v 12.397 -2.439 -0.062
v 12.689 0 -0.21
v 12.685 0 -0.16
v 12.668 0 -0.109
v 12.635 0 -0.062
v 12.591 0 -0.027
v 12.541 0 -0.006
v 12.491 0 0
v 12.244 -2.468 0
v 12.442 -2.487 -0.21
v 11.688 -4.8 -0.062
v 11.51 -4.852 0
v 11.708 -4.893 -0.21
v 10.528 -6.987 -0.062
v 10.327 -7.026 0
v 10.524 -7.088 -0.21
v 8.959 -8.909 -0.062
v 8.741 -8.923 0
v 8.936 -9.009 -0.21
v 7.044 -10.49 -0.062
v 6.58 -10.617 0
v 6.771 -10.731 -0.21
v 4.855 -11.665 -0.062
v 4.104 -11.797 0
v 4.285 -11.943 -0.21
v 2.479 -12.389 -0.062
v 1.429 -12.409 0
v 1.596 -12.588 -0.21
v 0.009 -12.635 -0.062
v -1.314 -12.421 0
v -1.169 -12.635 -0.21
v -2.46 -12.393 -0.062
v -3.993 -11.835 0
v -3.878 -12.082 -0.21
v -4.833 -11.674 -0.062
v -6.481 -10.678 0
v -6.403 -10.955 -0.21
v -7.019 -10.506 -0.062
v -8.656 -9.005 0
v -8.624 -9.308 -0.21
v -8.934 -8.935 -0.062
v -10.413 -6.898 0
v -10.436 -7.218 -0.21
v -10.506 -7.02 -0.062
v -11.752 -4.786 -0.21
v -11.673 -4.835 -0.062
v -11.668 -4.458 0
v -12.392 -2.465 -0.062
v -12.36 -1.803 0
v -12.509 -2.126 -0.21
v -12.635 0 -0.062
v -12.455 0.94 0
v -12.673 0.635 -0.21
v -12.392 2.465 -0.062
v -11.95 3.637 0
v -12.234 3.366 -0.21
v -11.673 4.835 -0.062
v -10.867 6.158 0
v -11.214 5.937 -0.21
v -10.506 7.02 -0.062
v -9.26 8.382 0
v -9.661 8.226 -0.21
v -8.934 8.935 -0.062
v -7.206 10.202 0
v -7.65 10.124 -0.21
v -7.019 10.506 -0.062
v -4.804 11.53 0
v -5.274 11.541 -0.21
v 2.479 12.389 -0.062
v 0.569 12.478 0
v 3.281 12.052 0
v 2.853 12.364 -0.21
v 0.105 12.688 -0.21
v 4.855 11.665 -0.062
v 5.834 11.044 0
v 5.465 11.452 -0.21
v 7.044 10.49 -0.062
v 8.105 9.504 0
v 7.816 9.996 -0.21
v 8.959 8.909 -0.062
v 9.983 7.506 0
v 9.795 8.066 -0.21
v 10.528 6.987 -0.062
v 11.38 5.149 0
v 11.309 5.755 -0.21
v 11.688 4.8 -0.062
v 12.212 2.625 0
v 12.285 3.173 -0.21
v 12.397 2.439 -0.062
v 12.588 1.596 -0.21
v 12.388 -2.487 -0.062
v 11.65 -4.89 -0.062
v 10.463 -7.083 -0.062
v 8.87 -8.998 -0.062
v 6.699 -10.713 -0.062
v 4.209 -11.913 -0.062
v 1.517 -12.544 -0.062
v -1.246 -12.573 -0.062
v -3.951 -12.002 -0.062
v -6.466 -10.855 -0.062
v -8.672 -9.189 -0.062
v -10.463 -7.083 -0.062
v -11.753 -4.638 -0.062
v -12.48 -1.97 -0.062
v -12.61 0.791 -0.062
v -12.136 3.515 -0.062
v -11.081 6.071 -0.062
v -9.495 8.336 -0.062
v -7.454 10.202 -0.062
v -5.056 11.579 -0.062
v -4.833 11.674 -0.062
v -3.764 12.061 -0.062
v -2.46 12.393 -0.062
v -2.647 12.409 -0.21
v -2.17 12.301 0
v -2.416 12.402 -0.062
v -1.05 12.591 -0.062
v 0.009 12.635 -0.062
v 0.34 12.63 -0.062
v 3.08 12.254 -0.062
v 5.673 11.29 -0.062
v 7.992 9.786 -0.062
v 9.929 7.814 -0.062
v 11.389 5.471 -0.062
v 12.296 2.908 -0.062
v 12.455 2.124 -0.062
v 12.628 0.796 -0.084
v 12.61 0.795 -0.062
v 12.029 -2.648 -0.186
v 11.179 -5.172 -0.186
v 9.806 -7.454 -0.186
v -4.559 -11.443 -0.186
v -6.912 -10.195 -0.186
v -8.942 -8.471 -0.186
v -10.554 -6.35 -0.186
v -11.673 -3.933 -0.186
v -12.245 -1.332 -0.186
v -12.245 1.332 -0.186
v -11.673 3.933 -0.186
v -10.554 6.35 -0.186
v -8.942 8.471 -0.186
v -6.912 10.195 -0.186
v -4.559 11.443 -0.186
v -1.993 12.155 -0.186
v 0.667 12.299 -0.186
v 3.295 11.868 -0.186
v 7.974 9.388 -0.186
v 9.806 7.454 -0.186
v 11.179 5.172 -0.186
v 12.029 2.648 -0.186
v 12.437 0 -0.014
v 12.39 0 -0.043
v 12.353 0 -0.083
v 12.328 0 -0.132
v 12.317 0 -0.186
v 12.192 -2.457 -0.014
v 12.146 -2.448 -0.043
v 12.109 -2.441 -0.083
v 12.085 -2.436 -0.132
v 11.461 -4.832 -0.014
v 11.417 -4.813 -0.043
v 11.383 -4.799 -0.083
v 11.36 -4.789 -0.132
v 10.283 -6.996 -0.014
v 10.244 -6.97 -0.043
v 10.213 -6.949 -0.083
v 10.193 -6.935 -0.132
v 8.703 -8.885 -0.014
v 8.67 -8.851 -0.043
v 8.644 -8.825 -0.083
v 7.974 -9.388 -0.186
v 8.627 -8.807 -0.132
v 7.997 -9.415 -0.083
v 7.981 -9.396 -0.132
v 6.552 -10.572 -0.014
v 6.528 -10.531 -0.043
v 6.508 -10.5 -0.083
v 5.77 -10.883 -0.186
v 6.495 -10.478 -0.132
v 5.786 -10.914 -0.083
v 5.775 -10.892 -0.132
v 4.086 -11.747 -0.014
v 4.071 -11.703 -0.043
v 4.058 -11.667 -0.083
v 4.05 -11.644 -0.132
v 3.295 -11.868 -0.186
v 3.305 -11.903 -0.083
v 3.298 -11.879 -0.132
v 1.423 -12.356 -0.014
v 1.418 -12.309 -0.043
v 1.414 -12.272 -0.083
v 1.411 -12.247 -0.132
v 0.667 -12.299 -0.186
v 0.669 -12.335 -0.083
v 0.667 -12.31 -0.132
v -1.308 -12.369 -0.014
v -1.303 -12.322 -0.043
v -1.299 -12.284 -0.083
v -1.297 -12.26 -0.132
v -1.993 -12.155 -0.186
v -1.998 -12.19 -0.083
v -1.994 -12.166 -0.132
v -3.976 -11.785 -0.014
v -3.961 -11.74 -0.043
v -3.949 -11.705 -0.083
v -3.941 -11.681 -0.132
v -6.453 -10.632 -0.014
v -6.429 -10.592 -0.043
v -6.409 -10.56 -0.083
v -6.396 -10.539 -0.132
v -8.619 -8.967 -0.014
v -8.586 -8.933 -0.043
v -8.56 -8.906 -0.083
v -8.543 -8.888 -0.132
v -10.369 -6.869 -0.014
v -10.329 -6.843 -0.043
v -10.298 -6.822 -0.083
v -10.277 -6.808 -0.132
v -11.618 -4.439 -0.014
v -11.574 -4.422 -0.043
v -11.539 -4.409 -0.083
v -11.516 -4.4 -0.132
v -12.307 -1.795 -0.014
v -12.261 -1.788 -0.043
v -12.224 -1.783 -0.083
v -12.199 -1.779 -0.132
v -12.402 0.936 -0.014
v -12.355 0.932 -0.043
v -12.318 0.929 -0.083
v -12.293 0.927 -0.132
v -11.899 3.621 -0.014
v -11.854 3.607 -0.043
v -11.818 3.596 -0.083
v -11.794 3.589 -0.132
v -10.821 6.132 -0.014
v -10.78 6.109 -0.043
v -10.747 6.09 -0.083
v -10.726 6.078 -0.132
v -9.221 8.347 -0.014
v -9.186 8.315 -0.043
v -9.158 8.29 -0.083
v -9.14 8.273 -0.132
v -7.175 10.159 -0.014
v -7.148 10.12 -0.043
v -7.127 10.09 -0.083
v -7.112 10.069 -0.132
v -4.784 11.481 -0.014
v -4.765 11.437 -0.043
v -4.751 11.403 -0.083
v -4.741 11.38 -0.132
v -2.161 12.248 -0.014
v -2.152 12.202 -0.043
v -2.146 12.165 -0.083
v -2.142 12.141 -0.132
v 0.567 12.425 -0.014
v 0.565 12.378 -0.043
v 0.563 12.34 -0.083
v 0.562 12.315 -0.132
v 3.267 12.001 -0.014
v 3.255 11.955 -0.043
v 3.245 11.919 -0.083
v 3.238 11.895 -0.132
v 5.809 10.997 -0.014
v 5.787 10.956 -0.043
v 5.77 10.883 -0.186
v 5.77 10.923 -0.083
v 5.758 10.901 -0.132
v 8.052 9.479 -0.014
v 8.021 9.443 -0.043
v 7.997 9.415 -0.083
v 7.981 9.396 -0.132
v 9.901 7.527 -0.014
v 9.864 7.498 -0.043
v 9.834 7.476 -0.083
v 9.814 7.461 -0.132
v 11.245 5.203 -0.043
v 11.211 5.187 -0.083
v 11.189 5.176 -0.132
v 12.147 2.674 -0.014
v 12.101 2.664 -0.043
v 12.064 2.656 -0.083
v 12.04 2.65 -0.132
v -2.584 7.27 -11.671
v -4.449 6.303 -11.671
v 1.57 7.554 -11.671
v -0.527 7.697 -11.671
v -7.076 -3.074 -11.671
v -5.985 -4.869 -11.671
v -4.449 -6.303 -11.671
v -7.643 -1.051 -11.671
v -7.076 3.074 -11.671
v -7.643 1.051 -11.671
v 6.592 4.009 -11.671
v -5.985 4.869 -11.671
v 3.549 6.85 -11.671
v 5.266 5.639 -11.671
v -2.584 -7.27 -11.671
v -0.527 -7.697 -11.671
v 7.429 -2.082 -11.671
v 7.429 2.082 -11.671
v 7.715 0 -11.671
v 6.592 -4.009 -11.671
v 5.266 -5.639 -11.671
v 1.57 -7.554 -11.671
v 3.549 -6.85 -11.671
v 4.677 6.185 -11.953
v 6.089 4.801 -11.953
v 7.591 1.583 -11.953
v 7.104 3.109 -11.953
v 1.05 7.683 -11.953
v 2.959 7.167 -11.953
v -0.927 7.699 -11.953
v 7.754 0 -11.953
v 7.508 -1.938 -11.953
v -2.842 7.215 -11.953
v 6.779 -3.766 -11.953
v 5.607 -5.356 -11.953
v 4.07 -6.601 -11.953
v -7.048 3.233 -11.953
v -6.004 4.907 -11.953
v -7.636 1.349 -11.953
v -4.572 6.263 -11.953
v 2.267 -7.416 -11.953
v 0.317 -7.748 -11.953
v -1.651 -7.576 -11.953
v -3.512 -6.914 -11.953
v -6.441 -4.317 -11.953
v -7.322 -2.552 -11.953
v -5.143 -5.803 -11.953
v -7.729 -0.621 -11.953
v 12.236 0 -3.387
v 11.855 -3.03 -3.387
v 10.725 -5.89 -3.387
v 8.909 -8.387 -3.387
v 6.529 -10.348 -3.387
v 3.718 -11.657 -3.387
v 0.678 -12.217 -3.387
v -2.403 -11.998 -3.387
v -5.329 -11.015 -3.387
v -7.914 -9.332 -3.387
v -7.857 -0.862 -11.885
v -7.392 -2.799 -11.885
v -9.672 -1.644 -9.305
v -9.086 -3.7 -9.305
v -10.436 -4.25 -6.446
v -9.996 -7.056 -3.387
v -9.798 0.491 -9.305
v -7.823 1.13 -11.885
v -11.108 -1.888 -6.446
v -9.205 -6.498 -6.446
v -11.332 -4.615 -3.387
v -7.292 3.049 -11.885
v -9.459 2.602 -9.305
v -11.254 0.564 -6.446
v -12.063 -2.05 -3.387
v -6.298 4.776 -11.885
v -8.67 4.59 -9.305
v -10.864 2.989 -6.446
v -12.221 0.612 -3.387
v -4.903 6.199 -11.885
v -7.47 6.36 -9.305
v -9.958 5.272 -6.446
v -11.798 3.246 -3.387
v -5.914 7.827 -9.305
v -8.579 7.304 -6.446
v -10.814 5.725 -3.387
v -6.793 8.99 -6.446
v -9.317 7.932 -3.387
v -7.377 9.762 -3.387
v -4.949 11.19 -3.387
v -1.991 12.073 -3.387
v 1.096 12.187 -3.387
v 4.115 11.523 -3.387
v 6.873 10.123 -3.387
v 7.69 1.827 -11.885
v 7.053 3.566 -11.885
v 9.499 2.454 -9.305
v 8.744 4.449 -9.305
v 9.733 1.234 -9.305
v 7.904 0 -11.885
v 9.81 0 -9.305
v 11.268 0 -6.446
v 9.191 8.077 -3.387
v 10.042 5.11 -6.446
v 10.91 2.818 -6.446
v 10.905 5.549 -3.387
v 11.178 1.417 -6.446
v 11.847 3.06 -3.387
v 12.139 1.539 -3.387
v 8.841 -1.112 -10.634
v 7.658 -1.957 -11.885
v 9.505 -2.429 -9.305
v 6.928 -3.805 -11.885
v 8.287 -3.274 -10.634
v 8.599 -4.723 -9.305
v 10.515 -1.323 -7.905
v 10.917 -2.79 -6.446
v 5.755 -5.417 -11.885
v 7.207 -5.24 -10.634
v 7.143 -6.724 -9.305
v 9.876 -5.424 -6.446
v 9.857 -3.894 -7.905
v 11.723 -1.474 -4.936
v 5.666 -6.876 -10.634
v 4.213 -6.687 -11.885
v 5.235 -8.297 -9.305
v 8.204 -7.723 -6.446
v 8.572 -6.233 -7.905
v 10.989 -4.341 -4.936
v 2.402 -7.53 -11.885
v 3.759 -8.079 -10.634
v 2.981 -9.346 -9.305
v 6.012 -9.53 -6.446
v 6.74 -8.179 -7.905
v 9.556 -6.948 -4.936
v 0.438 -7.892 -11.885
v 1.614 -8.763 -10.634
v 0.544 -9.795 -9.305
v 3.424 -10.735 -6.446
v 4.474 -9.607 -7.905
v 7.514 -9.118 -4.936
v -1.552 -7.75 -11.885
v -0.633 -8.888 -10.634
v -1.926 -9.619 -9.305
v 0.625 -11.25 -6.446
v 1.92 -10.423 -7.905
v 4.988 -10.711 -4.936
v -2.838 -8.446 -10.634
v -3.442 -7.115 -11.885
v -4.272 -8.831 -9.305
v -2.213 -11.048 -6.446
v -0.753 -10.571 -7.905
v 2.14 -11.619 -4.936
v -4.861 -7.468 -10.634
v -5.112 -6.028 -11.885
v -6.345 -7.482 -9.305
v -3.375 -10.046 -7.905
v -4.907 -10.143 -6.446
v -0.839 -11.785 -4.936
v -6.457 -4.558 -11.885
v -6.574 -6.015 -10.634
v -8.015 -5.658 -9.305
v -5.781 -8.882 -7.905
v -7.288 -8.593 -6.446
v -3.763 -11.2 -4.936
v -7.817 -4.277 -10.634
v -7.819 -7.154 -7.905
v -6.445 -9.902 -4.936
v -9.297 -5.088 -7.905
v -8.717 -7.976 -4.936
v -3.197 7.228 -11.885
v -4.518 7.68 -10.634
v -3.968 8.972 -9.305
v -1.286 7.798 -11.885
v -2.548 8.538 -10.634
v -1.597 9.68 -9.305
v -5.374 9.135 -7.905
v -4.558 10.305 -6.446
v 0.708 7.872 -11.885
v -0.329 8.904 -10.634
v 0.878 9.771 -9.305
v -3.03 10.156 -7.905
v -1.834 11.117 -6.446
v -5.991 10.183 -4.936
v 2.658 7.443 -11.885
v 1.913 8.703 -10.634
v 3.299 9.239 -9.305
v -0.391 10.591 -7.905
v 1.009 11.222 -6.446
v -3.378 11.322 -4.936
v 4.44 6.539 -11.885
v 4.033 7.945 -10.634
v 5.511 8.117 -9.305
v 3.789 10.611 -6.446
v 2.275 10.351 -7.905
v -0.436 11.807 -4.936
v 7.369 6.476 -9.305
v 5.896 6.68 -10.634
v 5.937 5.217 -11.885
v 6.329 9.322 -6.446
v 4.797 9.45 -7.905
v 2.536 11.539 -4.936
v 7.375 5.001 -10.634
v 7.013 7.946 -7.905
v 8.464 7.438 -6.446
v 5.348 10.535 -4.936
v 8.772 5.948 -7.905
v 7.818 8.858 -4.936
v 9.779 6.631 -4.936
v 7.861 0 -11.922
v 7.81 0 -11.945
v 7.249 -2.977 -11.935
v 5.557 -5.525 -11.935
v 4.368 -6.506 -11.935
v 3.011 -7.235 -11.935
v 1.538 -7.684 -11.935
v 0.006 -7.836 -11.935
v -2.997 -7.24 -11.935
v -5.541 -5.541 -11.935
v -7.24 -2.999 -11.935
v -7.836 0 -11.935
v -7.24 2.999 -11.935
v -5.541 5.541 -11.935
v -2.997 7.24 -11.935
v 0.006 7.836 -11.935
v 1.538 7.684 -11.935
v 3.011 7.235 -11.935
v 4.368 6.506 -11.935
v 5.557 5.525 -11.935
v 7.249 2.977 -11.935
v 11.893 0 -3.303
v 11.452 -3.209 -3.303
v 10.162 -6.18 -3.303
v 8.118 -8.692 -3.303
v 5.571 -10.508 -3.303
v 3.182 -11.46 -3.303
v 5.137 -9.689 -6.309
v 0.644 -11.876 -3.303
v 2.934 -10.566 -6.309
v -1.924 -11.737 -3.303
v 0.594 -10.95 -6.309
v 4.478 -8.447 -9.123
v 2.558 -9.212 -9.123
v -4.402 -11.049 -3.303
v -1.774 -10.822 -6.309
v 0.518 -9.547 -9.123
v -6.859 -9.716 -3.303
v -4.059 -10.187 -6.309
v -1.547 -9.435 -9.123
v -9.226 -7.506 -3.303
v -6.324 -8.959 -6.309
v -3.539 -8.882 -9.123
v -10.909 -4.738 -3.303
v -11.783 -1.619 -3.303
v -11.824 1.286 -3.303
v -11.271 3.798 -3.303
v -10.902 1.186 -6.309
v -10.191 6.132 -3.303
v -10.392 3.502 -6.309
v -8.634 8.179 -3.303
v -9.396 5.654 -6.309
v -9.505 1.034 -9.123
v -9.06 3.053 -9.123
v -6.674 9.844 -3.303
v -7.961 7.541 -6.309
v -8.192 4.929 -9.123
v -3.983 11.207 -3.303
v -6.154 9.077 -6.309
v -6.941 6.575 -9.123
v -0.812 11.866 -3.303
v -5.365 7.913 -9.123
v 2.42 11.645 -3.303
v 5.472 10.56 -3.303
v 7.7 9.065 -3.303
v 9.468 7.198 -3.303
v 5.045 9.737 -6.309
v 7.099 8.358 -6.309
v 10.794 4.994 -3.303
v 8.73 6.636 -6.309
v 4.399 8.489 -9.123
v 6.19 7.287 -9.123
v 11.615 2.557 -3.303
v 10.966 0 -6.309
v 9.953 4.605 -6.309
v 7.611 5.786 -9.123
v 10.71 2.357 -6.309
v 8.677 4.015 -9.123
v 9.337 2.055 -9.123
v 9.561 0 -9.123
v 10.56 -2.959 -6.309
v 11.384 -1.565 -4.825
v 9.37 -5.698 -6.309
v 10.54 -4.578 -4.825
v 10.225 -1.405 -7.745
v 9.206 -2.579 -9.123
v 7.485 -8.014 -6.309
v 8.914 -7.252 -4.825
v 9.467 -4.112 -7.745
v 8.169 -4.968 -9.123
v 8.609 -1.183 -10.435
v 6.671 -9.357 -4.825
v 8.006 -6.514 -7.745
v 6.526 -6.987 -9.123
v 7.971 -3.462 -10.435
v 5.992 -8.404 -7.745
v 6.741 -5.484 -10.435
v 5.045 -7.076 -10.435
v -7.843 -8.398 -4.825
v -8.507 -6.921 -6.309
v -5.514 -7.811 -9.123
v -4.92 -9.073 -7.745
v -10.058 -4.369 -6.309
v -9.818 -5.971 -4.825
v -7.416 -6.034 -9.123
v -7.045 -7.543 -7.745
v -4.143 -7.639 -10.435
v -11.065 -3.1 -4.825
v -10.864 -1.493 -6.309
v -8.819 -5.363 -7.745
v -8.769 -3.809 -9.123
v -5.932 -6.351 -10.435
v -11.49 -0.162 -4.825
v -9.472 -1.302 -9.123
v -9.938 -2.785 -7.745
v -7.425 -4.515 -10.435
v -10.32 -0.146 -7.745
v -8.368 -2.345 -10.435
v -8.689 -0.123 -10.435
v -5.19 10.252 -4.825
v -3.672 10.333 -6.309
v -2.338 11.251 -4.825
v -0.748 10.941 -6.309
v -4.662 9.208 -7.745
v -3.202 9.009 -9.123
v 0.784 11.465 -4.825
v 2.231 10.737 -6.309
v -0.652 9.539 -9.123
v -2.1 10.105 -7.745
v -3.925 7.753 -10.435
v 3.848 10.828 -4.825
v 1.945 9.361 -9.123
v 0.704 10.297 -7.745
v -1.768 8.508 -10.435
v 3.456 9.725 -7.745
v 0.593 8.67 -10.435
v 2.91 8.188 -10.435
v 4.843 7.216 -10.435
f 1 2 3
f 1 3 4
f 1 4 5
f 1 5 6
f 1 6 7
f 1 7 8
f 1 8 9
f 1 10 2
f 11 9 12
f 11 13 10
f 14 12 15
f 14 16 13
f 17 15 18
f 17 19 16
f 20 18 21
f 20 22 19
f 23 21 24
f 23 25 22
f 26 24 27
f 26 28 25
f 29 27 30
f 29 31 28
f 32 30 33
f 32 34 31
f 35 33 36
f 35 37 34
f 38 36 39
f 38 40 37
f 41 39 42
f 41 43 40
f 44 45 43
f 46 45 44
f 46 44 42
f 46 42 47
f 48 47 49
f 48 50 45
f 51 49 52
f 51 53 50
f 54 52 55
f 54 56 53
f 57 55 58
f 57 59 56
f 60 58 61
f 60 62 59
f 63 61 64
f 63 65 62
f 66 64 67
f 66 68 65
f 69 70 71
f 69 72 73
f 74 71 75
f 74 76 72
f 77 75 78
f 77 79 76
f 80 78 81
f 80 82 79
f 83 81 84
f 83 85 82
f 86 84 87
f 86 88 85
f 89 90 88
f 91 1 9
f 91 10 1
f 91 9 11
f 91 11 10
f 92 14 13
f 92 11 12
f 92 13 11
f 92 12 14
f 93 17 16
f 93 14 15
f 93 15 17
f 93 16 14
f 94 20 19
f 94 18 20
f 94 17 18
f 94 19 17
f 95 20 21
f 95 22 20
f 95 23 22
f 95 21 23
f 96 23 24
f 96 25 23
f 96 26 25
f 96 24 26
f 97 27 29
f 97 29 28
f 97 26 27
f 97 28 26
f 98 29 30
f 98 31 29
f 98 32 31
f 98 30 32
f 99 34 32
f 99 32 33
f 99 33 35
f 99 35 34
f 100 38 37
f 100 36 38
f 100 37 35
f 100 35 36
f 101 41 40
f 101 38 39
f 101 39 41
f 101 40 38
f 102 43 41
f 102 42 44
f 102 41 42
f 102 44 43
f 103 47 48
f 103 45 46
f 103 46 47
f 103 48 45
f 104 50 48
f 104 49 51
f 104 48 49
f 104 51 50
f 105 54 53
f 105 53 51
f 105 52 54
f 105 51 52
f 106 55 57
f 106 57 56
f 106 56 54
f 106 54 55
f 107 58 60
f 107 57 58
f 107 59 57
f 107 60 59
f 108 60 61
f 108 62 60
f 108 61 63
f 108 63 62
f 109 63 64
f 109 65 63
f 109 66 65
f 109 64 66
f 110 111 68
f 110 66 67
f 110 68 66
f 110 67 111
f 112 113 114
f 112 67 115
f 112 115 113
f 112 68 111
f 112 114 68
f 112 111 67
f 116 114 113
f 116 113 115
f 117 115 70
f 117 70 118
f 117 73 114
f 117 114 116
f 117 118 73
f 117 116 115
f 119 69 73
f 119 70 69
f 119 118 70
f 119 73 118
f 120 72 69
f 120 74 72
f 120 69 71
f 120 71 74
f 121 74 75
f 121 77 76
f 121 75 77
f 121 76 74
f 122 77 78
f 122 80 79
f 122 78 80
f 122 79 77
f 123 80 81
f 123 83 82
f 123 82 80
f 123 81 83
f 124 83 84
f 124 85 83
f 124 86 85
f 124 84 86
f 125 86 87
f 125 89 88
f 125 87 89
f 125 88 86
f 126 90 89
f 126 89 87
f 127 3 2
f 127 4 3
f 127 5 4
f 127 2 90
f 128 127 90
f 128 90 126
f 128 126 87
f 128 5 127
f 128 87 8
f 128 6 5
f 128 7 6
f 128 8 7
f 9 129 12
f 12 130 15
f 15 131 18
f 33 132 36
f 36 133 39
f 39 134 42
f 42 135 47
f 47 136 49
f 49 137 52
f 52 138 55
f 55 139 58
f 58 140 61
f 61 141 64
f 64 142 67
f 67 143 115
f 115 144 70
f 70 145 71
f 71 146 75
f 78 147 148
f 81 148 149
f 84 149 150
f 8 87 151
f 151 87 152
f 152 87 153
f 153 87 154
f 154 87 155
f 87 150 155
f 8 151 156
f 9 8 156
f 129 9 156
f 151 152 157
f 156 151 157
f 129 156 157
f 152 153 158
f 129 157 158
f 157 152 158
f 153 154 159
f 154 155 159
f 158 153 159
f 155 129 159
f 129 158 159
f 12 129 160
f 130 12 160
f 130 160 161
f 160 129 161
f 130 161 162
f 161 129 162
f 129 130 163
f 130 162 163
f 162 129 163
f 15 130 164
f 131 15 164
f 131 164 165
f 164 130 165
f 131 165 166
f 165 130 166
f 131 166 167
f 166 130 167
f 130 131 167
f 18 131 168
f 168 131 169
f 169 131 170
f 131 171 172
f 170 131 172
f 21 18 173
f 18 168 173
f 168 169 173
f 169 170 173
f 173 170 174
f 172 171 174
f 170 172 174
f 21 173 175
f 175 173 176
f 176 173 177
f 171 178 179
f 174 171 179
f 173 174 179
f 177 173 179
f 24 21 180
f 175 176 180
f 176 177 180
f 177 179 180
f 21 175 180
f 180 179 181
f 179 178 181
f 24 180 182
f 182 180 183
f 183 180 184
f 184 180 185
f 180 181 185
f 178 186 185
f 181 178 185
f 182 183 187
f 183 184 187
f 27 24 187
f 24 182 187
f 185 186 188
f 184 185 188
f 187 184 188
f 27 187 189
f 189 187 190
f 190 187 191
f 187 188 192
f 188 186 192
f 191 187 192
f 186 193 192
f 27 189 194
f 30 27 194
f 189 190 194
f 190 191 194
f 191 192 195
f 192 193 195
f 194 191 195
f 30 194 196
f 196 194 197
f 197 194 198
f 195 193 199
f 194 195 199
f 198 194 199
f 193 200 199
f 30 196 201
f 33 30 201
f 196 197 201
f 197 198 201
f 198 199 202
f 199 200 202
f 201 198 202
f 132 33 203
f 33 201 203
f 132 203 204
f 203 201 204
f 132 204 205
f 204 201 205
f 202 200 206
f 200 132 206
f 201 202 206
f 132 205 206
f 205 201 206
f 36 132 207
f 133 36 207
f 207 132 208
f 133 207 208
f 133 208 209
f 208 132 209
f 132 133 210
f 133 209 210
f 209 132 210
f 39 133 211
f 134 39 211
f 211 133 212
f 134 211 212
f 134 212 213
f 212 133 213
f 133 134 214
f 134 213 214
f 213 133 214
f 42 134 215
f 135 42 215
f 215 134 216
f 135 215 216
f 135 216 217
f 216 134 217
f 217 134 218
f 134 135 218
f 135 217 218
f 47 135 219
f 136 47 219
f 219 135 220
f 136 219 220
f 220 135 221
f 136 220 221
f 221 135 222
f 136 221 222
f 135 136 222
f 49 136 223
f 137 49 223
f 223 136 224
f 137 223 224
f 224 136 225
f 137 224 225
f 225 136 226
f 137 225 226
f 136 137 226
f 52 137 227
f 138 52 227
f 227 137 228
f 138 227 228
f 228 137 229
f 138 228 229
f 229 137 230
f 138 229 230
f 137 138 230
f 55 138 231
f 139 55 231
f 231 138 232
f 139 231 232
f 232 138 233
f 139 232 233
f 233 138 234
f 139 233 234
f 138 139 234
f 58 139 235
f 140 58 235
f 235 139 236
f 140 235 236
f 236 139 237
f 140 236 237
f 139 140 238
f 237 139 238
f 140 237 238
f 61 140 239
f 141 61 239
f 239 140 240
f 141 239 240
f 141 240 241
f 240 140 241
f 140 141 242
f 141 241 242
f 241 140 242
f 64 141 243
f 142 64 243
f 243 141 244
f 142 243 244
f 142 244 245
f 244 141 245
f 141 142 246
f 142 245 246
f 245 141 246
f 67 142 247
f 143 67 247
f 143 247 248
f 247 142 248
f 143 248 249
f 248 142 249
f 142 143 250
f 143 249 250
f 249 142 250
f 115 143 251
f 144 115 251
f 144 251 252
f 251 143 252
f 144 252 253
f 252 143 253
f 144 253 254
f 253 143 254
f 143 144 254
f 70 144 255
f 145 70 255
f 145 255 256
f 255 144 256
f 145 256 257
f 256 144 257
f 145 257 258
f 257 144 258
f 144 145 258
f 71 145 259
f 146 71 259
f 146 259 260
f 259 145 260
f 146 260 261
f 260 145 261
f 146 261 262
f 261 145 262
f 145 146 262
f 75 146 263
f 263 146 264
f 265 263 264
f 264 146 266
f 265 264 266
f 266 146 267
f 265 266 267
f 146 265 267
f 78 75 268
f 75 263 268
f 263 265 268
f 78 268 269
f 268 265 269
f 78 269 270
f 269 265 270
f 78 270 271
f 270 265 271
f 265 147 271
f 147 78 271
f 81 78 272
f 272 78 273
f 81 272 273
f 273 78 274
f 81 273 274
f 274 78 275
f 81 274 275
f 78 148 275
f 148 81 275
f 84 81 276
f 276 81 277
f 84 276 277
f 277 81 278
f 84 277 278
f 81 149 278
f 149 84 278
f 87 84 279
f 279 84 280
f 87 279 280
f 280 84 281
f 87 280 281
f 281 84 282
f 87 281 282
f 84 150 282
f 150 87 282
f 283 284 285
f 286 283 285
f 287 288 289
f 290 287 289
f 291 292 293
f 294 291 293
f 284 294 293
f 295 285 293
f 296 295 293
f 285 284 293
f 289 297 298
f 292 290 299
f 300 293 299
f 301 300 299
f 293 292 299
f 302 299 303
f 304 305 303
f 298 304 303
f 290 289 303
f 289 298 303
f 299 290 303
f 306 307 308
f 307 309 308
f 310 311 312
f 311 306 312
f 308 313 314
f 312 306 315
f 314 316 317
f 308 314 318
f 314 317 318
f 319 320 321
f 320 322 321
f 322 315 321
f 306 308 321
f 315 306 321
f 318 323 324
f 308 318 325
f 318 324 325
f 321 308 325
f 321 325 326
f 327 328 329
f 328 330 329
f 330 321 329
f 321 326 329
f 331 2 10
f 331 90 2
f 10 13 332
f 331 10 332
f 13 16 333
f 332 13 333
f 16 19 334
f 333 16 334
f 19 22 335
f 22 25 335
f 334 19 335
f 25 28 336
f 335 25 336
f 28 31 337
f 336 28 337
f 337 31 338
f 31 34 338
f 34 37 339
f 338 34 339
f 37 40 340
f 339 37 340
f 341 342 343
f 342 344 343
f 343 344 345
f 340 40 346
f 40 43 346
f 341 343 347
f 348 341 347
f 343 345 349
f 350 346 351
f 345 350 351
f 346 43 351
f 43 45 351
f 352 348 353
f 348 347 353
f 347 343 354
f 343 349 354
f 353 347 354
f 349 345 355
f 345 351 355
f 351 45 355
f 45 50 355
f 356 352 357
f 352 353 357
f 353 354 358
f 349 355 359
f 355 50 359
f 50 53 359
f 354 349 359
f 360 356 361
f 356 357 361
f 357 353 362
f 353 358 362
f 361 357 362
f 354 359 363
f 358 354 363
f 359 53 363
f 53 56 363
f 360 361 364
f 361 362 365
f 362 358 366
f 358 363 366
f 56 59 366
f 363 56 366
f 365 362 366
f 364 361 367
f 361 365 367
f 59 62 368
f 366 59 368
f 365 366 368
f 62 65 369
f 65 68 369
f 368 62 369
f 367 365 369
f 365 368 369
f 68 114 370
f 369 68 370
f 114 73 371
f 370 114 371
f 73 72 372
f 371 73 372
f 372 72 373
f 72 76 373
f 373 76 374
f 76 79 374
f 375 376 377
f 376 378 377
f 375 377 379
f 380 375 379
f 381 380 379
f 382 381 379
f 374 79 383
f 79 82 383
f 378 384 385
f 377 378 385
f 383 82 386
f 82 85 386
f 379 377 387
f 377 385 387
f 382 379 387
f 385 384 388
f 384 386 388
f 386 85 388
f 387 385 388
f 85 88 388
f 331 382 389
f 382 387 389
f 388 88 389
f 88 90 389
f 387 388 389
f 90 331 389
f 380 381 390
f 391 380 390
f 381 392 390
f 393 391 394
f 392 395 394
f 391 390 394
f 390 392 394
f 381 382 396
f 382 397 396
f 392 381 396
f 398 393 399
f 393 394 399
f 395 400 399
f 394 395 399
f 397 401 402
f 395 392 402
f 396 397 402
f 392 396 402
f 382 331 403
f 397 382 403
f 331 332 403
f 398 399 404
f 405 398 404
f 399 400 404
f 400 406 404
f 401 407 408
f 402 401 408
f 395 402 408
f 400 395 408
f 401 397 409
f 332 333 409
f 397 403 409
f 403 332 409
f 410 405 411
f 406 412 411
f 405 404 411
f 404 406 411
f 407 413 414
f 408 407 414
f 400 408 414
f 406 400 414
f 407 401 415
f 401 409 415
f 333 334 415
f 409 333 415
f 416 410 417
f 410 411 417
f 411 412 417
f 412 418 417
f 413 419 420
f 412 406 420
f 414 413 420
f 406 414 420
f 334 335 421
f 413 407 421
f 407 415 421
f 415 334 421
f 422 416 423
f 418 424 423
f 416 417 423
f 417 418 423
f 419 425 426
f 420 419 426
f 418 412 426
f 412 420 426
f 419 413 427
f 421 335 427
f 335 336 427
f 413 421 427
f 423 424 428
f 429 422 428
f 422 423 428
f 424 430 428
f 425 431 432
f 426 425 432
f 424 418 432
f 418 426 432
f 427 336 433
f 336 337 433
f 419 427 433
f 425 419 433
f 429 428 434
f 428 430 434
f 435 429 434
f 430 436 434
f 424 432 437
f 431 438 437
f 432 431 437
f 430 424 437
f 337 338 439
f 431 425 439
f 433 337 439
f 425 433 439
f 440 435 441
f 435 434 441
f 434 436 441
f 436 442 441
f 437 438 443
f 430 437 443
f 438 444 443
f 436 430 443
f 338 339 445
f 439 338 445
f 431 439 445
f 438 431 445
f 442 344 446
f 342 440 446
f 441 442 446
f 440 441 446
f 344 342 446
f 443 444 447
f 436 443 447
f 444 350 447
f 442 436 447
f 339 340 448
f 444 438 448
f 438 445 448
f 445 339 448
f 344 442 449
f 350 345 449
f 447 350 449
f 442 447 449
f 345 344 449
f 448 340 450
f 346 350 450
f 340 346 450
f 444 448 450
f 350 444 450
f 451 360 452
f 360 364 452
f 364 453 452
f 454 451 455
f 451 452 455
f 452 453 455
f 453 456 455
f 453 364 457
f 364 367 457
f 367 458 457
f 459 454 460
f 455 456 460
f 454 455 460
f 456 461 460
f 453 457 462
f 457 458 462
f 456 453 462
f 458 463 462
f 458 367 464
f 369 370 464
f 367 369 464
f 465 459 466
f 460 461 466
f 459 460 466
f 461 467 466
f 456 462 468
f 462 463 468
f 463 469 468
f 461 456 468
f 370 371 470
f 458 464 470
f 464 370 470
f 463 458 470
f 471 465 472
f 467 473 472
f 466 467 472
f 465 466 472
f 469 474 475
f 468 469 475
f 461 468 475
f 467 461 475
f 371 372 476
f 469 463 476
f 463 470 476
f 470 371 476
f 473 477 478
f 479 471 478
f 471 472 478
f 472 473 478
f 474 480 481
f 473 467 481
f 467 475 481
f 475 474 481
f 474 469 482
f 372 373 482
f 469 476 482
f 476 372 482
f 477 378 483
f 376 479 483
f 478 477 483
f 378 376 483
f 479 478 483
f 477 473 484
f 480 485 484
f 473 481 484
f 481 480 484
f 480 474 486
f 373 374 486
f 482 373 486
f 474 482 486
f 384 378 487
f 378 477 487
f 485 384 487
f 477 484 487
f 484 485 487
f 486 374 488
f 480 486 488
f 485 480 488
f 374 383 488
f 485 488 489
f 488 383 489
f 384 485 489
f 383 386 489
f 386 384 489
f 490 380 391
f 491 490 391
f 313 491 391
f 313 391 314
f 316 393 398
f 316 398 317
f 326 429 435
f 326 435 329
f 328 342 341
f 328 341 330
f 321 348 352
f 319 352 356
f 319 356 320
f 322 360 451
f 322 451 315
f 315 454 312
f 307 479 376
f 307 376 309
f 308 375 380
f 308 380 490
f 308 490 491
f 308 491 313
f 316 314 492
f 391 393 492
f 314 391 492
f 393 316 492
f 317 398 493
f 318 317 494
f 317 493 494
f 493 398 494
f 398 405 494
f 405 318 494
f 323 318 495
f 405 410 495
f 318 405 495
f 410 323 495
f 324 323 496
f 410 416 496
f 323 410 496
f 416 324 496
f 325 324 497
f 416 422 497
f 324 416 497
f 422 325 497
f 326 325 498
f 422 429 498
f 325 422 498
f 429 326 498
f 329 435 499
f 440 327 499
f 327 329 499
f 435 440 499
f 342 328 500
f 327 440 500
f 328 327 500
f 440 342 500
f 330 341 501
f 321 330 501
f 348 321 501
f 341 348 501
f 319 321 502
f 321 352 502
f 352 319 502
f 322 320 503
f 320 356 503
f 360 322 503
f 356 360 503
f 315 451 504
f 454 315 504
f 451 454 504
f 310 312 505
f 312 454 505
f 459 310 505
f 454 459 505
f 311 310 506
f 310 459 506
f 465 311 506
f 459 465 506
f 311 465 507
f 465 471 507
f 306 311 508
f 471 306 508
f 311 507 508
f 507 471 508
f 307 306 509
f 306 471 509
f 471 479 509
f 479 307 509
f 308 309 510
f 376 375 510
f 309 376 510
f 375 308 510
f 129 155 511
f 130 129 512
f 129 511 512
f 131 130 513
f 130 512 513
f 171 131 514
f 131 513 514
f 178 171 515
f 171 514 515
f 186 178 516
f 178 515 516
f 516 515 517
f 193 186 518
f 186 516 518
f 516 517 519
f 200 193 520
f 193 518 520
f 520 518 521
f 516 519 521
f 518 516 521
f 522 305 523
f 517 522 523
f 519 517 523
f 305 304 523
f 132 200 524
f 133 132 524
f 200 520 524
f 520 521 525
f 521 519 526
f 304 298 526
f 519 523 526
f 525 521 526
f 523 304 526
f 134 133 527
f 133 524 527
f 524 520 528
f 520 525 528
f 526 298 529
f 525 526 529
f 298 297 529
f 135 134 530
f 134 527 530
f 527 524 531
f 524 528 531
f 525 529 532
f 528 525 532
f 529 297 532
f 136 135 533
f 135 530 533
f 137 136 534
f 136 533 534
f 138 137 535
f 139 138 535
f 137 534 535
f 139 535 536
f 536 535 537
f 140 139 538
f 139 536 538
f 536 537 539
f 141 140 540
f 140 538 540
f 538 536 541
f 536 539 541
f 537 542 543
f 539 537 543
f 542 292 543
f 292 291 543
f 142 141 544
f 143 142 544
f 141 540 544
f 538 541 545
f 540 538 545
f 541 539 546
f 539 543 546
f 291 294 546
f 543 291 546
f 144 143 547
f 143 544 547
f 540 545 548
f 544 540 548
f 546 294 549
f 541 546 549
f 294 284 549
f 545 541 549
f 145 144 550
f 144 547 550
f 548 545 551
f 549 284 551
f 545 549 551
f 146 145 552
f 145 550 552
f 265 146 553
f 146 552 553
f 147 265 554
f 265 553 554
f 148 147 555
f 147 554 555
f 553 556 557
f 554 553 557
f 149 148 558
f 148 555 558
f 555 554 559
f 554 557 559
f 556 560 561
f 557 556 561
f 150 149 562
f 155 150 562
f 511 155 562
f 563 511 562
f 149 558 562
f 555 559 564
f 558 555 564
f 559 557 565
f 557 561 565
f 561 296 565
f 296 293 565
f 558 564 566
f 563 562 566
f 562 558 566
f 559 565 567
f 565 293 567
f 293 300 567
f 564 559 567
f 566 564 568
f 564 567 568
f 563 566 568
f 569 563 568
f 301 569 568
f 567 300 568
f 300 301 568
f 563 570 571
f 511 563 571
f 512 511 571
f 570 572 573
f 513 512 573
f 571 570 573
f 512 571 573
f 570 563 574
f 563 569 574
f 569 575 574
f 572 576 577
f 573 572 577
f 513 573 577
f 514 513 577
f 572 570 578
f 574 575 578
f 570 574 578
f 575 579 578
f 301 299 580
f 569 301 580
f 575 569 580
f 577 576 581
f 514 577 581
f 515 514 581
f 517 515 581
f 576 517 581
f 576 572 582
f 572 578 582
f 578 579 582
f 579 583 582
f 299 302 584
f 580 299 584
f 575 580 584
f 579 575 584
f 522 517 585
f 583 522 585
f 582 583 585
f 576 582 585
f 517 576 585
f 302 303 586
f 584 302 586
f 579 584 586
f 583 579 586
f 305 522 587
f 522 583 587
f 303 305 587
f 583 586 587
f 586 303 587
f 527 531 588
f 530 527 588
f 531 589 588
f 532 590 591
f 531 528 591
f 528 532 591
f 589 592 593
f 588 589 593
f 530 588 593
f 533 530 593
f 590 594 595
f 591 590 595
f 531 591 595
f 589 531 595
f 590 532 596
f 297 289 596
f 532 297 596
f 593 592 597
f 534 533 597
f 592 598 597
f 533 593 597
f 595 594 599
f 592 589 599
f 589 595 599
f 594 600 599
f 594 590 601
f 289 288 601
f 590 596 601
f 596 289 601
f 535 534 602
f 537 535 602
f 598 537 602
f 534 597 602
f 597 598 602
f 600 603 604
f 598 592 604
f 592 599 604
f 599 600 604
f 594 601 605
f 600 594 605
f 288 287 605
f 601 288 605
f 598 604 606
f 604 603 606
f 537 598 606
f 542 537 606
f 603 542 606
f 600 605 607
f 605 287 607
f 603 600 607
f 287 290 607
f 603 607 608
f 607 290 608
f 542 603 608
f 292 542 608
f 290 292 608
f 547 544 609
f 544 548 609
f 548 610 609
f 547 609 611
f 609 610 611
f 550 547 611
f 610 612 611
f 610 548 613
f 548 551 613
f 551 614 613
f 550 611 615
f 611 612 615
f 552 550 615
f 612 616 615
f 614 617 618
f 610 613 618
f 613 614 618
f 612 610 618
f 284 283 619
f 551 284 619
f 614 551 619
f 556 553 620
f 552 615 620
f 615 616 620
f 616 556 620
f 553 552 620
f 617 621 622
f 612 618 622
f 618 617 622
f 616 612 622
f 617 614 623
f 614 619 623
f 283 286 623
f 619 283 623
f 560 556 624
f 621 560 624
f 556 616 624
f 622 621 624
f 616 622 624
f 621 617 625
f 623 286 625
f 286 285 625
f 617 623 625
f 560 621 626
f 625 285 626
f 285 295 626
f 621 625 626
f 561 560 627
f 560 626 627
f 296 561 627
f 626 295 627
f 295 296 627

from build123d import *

# Parameters (mm, degrees)
F2_R = 0.1984375
F4_R = 0.1984375


# Not quite as in the source:
# - a fillet or chamfer that OpenCascade refuses, or shapes differently, is made with other operations: its cross-section is extruded or revolved along the edge and cut away or added


with BuildPart() as f1:
    # F0 (on Front) → F1 (revolve)
    with BuildSketch(Plane.XZ):
        with BuildLine():
            Line((7.7151542774, -11.6706086199), (0, -11.6706086199))
            Line((0, -11.6706086199), (0, -11.9529411765))
            Line((0, -11.9529411765), (7.8441176471, -11.9529411765))
            ThreePointArc((7.8441176471, -11.9529411765), (11.2904230804, -6.3901810676), (12.7, 0))
            Line((12.7, 0), (12.3264705882, 0))
            ThreePointArc((12.3264705882, 0), (11.0006527428, -6.2224609485), (7.7151542774, -11.6706086199))
        make_face()
    revolve(axis=Axis((0, 0, -5.9764705882), (0, 0, -1)))

    # F2
    f2_edges = [f1.edges().sort_by_distance(p)[0] for p in [
        (-12.7, 0, 0),
    ]]
    fillet(f2_edges, radius=F2_R)

    # F3: fillet of radius 0.1984375 on 1 edges, made by hand

    # F3_s1 → F3_t2 (revolve, cut)
    with BuildSketch(Plane.XZ):
        with BuildLine():
            ThreePointArc((12.490604679, 0), (12.3702545725, -0.0617556355), (12.3174431547, -0.1862902123))
            ThreePointArc((12.3174431547, -0.1862902123), (12.3221829622, -0.0931560623), (12.3264705882, 0))
            Line((12.3264705882, 0), (12.490604679, 0))
        make_face()
    revolve(axis=Axis((0, 0, 0), (0, 0, -1)), mode=Mode.SUBTRACT)

    # F4
    f4_edges = [f1.edges().sort_by_distance(p)[0] for p in [
        (-7.844118, 0, -11.952941),
    ]]
    fillet(f4_edges, radius=F4_R)


solid = f1.part
